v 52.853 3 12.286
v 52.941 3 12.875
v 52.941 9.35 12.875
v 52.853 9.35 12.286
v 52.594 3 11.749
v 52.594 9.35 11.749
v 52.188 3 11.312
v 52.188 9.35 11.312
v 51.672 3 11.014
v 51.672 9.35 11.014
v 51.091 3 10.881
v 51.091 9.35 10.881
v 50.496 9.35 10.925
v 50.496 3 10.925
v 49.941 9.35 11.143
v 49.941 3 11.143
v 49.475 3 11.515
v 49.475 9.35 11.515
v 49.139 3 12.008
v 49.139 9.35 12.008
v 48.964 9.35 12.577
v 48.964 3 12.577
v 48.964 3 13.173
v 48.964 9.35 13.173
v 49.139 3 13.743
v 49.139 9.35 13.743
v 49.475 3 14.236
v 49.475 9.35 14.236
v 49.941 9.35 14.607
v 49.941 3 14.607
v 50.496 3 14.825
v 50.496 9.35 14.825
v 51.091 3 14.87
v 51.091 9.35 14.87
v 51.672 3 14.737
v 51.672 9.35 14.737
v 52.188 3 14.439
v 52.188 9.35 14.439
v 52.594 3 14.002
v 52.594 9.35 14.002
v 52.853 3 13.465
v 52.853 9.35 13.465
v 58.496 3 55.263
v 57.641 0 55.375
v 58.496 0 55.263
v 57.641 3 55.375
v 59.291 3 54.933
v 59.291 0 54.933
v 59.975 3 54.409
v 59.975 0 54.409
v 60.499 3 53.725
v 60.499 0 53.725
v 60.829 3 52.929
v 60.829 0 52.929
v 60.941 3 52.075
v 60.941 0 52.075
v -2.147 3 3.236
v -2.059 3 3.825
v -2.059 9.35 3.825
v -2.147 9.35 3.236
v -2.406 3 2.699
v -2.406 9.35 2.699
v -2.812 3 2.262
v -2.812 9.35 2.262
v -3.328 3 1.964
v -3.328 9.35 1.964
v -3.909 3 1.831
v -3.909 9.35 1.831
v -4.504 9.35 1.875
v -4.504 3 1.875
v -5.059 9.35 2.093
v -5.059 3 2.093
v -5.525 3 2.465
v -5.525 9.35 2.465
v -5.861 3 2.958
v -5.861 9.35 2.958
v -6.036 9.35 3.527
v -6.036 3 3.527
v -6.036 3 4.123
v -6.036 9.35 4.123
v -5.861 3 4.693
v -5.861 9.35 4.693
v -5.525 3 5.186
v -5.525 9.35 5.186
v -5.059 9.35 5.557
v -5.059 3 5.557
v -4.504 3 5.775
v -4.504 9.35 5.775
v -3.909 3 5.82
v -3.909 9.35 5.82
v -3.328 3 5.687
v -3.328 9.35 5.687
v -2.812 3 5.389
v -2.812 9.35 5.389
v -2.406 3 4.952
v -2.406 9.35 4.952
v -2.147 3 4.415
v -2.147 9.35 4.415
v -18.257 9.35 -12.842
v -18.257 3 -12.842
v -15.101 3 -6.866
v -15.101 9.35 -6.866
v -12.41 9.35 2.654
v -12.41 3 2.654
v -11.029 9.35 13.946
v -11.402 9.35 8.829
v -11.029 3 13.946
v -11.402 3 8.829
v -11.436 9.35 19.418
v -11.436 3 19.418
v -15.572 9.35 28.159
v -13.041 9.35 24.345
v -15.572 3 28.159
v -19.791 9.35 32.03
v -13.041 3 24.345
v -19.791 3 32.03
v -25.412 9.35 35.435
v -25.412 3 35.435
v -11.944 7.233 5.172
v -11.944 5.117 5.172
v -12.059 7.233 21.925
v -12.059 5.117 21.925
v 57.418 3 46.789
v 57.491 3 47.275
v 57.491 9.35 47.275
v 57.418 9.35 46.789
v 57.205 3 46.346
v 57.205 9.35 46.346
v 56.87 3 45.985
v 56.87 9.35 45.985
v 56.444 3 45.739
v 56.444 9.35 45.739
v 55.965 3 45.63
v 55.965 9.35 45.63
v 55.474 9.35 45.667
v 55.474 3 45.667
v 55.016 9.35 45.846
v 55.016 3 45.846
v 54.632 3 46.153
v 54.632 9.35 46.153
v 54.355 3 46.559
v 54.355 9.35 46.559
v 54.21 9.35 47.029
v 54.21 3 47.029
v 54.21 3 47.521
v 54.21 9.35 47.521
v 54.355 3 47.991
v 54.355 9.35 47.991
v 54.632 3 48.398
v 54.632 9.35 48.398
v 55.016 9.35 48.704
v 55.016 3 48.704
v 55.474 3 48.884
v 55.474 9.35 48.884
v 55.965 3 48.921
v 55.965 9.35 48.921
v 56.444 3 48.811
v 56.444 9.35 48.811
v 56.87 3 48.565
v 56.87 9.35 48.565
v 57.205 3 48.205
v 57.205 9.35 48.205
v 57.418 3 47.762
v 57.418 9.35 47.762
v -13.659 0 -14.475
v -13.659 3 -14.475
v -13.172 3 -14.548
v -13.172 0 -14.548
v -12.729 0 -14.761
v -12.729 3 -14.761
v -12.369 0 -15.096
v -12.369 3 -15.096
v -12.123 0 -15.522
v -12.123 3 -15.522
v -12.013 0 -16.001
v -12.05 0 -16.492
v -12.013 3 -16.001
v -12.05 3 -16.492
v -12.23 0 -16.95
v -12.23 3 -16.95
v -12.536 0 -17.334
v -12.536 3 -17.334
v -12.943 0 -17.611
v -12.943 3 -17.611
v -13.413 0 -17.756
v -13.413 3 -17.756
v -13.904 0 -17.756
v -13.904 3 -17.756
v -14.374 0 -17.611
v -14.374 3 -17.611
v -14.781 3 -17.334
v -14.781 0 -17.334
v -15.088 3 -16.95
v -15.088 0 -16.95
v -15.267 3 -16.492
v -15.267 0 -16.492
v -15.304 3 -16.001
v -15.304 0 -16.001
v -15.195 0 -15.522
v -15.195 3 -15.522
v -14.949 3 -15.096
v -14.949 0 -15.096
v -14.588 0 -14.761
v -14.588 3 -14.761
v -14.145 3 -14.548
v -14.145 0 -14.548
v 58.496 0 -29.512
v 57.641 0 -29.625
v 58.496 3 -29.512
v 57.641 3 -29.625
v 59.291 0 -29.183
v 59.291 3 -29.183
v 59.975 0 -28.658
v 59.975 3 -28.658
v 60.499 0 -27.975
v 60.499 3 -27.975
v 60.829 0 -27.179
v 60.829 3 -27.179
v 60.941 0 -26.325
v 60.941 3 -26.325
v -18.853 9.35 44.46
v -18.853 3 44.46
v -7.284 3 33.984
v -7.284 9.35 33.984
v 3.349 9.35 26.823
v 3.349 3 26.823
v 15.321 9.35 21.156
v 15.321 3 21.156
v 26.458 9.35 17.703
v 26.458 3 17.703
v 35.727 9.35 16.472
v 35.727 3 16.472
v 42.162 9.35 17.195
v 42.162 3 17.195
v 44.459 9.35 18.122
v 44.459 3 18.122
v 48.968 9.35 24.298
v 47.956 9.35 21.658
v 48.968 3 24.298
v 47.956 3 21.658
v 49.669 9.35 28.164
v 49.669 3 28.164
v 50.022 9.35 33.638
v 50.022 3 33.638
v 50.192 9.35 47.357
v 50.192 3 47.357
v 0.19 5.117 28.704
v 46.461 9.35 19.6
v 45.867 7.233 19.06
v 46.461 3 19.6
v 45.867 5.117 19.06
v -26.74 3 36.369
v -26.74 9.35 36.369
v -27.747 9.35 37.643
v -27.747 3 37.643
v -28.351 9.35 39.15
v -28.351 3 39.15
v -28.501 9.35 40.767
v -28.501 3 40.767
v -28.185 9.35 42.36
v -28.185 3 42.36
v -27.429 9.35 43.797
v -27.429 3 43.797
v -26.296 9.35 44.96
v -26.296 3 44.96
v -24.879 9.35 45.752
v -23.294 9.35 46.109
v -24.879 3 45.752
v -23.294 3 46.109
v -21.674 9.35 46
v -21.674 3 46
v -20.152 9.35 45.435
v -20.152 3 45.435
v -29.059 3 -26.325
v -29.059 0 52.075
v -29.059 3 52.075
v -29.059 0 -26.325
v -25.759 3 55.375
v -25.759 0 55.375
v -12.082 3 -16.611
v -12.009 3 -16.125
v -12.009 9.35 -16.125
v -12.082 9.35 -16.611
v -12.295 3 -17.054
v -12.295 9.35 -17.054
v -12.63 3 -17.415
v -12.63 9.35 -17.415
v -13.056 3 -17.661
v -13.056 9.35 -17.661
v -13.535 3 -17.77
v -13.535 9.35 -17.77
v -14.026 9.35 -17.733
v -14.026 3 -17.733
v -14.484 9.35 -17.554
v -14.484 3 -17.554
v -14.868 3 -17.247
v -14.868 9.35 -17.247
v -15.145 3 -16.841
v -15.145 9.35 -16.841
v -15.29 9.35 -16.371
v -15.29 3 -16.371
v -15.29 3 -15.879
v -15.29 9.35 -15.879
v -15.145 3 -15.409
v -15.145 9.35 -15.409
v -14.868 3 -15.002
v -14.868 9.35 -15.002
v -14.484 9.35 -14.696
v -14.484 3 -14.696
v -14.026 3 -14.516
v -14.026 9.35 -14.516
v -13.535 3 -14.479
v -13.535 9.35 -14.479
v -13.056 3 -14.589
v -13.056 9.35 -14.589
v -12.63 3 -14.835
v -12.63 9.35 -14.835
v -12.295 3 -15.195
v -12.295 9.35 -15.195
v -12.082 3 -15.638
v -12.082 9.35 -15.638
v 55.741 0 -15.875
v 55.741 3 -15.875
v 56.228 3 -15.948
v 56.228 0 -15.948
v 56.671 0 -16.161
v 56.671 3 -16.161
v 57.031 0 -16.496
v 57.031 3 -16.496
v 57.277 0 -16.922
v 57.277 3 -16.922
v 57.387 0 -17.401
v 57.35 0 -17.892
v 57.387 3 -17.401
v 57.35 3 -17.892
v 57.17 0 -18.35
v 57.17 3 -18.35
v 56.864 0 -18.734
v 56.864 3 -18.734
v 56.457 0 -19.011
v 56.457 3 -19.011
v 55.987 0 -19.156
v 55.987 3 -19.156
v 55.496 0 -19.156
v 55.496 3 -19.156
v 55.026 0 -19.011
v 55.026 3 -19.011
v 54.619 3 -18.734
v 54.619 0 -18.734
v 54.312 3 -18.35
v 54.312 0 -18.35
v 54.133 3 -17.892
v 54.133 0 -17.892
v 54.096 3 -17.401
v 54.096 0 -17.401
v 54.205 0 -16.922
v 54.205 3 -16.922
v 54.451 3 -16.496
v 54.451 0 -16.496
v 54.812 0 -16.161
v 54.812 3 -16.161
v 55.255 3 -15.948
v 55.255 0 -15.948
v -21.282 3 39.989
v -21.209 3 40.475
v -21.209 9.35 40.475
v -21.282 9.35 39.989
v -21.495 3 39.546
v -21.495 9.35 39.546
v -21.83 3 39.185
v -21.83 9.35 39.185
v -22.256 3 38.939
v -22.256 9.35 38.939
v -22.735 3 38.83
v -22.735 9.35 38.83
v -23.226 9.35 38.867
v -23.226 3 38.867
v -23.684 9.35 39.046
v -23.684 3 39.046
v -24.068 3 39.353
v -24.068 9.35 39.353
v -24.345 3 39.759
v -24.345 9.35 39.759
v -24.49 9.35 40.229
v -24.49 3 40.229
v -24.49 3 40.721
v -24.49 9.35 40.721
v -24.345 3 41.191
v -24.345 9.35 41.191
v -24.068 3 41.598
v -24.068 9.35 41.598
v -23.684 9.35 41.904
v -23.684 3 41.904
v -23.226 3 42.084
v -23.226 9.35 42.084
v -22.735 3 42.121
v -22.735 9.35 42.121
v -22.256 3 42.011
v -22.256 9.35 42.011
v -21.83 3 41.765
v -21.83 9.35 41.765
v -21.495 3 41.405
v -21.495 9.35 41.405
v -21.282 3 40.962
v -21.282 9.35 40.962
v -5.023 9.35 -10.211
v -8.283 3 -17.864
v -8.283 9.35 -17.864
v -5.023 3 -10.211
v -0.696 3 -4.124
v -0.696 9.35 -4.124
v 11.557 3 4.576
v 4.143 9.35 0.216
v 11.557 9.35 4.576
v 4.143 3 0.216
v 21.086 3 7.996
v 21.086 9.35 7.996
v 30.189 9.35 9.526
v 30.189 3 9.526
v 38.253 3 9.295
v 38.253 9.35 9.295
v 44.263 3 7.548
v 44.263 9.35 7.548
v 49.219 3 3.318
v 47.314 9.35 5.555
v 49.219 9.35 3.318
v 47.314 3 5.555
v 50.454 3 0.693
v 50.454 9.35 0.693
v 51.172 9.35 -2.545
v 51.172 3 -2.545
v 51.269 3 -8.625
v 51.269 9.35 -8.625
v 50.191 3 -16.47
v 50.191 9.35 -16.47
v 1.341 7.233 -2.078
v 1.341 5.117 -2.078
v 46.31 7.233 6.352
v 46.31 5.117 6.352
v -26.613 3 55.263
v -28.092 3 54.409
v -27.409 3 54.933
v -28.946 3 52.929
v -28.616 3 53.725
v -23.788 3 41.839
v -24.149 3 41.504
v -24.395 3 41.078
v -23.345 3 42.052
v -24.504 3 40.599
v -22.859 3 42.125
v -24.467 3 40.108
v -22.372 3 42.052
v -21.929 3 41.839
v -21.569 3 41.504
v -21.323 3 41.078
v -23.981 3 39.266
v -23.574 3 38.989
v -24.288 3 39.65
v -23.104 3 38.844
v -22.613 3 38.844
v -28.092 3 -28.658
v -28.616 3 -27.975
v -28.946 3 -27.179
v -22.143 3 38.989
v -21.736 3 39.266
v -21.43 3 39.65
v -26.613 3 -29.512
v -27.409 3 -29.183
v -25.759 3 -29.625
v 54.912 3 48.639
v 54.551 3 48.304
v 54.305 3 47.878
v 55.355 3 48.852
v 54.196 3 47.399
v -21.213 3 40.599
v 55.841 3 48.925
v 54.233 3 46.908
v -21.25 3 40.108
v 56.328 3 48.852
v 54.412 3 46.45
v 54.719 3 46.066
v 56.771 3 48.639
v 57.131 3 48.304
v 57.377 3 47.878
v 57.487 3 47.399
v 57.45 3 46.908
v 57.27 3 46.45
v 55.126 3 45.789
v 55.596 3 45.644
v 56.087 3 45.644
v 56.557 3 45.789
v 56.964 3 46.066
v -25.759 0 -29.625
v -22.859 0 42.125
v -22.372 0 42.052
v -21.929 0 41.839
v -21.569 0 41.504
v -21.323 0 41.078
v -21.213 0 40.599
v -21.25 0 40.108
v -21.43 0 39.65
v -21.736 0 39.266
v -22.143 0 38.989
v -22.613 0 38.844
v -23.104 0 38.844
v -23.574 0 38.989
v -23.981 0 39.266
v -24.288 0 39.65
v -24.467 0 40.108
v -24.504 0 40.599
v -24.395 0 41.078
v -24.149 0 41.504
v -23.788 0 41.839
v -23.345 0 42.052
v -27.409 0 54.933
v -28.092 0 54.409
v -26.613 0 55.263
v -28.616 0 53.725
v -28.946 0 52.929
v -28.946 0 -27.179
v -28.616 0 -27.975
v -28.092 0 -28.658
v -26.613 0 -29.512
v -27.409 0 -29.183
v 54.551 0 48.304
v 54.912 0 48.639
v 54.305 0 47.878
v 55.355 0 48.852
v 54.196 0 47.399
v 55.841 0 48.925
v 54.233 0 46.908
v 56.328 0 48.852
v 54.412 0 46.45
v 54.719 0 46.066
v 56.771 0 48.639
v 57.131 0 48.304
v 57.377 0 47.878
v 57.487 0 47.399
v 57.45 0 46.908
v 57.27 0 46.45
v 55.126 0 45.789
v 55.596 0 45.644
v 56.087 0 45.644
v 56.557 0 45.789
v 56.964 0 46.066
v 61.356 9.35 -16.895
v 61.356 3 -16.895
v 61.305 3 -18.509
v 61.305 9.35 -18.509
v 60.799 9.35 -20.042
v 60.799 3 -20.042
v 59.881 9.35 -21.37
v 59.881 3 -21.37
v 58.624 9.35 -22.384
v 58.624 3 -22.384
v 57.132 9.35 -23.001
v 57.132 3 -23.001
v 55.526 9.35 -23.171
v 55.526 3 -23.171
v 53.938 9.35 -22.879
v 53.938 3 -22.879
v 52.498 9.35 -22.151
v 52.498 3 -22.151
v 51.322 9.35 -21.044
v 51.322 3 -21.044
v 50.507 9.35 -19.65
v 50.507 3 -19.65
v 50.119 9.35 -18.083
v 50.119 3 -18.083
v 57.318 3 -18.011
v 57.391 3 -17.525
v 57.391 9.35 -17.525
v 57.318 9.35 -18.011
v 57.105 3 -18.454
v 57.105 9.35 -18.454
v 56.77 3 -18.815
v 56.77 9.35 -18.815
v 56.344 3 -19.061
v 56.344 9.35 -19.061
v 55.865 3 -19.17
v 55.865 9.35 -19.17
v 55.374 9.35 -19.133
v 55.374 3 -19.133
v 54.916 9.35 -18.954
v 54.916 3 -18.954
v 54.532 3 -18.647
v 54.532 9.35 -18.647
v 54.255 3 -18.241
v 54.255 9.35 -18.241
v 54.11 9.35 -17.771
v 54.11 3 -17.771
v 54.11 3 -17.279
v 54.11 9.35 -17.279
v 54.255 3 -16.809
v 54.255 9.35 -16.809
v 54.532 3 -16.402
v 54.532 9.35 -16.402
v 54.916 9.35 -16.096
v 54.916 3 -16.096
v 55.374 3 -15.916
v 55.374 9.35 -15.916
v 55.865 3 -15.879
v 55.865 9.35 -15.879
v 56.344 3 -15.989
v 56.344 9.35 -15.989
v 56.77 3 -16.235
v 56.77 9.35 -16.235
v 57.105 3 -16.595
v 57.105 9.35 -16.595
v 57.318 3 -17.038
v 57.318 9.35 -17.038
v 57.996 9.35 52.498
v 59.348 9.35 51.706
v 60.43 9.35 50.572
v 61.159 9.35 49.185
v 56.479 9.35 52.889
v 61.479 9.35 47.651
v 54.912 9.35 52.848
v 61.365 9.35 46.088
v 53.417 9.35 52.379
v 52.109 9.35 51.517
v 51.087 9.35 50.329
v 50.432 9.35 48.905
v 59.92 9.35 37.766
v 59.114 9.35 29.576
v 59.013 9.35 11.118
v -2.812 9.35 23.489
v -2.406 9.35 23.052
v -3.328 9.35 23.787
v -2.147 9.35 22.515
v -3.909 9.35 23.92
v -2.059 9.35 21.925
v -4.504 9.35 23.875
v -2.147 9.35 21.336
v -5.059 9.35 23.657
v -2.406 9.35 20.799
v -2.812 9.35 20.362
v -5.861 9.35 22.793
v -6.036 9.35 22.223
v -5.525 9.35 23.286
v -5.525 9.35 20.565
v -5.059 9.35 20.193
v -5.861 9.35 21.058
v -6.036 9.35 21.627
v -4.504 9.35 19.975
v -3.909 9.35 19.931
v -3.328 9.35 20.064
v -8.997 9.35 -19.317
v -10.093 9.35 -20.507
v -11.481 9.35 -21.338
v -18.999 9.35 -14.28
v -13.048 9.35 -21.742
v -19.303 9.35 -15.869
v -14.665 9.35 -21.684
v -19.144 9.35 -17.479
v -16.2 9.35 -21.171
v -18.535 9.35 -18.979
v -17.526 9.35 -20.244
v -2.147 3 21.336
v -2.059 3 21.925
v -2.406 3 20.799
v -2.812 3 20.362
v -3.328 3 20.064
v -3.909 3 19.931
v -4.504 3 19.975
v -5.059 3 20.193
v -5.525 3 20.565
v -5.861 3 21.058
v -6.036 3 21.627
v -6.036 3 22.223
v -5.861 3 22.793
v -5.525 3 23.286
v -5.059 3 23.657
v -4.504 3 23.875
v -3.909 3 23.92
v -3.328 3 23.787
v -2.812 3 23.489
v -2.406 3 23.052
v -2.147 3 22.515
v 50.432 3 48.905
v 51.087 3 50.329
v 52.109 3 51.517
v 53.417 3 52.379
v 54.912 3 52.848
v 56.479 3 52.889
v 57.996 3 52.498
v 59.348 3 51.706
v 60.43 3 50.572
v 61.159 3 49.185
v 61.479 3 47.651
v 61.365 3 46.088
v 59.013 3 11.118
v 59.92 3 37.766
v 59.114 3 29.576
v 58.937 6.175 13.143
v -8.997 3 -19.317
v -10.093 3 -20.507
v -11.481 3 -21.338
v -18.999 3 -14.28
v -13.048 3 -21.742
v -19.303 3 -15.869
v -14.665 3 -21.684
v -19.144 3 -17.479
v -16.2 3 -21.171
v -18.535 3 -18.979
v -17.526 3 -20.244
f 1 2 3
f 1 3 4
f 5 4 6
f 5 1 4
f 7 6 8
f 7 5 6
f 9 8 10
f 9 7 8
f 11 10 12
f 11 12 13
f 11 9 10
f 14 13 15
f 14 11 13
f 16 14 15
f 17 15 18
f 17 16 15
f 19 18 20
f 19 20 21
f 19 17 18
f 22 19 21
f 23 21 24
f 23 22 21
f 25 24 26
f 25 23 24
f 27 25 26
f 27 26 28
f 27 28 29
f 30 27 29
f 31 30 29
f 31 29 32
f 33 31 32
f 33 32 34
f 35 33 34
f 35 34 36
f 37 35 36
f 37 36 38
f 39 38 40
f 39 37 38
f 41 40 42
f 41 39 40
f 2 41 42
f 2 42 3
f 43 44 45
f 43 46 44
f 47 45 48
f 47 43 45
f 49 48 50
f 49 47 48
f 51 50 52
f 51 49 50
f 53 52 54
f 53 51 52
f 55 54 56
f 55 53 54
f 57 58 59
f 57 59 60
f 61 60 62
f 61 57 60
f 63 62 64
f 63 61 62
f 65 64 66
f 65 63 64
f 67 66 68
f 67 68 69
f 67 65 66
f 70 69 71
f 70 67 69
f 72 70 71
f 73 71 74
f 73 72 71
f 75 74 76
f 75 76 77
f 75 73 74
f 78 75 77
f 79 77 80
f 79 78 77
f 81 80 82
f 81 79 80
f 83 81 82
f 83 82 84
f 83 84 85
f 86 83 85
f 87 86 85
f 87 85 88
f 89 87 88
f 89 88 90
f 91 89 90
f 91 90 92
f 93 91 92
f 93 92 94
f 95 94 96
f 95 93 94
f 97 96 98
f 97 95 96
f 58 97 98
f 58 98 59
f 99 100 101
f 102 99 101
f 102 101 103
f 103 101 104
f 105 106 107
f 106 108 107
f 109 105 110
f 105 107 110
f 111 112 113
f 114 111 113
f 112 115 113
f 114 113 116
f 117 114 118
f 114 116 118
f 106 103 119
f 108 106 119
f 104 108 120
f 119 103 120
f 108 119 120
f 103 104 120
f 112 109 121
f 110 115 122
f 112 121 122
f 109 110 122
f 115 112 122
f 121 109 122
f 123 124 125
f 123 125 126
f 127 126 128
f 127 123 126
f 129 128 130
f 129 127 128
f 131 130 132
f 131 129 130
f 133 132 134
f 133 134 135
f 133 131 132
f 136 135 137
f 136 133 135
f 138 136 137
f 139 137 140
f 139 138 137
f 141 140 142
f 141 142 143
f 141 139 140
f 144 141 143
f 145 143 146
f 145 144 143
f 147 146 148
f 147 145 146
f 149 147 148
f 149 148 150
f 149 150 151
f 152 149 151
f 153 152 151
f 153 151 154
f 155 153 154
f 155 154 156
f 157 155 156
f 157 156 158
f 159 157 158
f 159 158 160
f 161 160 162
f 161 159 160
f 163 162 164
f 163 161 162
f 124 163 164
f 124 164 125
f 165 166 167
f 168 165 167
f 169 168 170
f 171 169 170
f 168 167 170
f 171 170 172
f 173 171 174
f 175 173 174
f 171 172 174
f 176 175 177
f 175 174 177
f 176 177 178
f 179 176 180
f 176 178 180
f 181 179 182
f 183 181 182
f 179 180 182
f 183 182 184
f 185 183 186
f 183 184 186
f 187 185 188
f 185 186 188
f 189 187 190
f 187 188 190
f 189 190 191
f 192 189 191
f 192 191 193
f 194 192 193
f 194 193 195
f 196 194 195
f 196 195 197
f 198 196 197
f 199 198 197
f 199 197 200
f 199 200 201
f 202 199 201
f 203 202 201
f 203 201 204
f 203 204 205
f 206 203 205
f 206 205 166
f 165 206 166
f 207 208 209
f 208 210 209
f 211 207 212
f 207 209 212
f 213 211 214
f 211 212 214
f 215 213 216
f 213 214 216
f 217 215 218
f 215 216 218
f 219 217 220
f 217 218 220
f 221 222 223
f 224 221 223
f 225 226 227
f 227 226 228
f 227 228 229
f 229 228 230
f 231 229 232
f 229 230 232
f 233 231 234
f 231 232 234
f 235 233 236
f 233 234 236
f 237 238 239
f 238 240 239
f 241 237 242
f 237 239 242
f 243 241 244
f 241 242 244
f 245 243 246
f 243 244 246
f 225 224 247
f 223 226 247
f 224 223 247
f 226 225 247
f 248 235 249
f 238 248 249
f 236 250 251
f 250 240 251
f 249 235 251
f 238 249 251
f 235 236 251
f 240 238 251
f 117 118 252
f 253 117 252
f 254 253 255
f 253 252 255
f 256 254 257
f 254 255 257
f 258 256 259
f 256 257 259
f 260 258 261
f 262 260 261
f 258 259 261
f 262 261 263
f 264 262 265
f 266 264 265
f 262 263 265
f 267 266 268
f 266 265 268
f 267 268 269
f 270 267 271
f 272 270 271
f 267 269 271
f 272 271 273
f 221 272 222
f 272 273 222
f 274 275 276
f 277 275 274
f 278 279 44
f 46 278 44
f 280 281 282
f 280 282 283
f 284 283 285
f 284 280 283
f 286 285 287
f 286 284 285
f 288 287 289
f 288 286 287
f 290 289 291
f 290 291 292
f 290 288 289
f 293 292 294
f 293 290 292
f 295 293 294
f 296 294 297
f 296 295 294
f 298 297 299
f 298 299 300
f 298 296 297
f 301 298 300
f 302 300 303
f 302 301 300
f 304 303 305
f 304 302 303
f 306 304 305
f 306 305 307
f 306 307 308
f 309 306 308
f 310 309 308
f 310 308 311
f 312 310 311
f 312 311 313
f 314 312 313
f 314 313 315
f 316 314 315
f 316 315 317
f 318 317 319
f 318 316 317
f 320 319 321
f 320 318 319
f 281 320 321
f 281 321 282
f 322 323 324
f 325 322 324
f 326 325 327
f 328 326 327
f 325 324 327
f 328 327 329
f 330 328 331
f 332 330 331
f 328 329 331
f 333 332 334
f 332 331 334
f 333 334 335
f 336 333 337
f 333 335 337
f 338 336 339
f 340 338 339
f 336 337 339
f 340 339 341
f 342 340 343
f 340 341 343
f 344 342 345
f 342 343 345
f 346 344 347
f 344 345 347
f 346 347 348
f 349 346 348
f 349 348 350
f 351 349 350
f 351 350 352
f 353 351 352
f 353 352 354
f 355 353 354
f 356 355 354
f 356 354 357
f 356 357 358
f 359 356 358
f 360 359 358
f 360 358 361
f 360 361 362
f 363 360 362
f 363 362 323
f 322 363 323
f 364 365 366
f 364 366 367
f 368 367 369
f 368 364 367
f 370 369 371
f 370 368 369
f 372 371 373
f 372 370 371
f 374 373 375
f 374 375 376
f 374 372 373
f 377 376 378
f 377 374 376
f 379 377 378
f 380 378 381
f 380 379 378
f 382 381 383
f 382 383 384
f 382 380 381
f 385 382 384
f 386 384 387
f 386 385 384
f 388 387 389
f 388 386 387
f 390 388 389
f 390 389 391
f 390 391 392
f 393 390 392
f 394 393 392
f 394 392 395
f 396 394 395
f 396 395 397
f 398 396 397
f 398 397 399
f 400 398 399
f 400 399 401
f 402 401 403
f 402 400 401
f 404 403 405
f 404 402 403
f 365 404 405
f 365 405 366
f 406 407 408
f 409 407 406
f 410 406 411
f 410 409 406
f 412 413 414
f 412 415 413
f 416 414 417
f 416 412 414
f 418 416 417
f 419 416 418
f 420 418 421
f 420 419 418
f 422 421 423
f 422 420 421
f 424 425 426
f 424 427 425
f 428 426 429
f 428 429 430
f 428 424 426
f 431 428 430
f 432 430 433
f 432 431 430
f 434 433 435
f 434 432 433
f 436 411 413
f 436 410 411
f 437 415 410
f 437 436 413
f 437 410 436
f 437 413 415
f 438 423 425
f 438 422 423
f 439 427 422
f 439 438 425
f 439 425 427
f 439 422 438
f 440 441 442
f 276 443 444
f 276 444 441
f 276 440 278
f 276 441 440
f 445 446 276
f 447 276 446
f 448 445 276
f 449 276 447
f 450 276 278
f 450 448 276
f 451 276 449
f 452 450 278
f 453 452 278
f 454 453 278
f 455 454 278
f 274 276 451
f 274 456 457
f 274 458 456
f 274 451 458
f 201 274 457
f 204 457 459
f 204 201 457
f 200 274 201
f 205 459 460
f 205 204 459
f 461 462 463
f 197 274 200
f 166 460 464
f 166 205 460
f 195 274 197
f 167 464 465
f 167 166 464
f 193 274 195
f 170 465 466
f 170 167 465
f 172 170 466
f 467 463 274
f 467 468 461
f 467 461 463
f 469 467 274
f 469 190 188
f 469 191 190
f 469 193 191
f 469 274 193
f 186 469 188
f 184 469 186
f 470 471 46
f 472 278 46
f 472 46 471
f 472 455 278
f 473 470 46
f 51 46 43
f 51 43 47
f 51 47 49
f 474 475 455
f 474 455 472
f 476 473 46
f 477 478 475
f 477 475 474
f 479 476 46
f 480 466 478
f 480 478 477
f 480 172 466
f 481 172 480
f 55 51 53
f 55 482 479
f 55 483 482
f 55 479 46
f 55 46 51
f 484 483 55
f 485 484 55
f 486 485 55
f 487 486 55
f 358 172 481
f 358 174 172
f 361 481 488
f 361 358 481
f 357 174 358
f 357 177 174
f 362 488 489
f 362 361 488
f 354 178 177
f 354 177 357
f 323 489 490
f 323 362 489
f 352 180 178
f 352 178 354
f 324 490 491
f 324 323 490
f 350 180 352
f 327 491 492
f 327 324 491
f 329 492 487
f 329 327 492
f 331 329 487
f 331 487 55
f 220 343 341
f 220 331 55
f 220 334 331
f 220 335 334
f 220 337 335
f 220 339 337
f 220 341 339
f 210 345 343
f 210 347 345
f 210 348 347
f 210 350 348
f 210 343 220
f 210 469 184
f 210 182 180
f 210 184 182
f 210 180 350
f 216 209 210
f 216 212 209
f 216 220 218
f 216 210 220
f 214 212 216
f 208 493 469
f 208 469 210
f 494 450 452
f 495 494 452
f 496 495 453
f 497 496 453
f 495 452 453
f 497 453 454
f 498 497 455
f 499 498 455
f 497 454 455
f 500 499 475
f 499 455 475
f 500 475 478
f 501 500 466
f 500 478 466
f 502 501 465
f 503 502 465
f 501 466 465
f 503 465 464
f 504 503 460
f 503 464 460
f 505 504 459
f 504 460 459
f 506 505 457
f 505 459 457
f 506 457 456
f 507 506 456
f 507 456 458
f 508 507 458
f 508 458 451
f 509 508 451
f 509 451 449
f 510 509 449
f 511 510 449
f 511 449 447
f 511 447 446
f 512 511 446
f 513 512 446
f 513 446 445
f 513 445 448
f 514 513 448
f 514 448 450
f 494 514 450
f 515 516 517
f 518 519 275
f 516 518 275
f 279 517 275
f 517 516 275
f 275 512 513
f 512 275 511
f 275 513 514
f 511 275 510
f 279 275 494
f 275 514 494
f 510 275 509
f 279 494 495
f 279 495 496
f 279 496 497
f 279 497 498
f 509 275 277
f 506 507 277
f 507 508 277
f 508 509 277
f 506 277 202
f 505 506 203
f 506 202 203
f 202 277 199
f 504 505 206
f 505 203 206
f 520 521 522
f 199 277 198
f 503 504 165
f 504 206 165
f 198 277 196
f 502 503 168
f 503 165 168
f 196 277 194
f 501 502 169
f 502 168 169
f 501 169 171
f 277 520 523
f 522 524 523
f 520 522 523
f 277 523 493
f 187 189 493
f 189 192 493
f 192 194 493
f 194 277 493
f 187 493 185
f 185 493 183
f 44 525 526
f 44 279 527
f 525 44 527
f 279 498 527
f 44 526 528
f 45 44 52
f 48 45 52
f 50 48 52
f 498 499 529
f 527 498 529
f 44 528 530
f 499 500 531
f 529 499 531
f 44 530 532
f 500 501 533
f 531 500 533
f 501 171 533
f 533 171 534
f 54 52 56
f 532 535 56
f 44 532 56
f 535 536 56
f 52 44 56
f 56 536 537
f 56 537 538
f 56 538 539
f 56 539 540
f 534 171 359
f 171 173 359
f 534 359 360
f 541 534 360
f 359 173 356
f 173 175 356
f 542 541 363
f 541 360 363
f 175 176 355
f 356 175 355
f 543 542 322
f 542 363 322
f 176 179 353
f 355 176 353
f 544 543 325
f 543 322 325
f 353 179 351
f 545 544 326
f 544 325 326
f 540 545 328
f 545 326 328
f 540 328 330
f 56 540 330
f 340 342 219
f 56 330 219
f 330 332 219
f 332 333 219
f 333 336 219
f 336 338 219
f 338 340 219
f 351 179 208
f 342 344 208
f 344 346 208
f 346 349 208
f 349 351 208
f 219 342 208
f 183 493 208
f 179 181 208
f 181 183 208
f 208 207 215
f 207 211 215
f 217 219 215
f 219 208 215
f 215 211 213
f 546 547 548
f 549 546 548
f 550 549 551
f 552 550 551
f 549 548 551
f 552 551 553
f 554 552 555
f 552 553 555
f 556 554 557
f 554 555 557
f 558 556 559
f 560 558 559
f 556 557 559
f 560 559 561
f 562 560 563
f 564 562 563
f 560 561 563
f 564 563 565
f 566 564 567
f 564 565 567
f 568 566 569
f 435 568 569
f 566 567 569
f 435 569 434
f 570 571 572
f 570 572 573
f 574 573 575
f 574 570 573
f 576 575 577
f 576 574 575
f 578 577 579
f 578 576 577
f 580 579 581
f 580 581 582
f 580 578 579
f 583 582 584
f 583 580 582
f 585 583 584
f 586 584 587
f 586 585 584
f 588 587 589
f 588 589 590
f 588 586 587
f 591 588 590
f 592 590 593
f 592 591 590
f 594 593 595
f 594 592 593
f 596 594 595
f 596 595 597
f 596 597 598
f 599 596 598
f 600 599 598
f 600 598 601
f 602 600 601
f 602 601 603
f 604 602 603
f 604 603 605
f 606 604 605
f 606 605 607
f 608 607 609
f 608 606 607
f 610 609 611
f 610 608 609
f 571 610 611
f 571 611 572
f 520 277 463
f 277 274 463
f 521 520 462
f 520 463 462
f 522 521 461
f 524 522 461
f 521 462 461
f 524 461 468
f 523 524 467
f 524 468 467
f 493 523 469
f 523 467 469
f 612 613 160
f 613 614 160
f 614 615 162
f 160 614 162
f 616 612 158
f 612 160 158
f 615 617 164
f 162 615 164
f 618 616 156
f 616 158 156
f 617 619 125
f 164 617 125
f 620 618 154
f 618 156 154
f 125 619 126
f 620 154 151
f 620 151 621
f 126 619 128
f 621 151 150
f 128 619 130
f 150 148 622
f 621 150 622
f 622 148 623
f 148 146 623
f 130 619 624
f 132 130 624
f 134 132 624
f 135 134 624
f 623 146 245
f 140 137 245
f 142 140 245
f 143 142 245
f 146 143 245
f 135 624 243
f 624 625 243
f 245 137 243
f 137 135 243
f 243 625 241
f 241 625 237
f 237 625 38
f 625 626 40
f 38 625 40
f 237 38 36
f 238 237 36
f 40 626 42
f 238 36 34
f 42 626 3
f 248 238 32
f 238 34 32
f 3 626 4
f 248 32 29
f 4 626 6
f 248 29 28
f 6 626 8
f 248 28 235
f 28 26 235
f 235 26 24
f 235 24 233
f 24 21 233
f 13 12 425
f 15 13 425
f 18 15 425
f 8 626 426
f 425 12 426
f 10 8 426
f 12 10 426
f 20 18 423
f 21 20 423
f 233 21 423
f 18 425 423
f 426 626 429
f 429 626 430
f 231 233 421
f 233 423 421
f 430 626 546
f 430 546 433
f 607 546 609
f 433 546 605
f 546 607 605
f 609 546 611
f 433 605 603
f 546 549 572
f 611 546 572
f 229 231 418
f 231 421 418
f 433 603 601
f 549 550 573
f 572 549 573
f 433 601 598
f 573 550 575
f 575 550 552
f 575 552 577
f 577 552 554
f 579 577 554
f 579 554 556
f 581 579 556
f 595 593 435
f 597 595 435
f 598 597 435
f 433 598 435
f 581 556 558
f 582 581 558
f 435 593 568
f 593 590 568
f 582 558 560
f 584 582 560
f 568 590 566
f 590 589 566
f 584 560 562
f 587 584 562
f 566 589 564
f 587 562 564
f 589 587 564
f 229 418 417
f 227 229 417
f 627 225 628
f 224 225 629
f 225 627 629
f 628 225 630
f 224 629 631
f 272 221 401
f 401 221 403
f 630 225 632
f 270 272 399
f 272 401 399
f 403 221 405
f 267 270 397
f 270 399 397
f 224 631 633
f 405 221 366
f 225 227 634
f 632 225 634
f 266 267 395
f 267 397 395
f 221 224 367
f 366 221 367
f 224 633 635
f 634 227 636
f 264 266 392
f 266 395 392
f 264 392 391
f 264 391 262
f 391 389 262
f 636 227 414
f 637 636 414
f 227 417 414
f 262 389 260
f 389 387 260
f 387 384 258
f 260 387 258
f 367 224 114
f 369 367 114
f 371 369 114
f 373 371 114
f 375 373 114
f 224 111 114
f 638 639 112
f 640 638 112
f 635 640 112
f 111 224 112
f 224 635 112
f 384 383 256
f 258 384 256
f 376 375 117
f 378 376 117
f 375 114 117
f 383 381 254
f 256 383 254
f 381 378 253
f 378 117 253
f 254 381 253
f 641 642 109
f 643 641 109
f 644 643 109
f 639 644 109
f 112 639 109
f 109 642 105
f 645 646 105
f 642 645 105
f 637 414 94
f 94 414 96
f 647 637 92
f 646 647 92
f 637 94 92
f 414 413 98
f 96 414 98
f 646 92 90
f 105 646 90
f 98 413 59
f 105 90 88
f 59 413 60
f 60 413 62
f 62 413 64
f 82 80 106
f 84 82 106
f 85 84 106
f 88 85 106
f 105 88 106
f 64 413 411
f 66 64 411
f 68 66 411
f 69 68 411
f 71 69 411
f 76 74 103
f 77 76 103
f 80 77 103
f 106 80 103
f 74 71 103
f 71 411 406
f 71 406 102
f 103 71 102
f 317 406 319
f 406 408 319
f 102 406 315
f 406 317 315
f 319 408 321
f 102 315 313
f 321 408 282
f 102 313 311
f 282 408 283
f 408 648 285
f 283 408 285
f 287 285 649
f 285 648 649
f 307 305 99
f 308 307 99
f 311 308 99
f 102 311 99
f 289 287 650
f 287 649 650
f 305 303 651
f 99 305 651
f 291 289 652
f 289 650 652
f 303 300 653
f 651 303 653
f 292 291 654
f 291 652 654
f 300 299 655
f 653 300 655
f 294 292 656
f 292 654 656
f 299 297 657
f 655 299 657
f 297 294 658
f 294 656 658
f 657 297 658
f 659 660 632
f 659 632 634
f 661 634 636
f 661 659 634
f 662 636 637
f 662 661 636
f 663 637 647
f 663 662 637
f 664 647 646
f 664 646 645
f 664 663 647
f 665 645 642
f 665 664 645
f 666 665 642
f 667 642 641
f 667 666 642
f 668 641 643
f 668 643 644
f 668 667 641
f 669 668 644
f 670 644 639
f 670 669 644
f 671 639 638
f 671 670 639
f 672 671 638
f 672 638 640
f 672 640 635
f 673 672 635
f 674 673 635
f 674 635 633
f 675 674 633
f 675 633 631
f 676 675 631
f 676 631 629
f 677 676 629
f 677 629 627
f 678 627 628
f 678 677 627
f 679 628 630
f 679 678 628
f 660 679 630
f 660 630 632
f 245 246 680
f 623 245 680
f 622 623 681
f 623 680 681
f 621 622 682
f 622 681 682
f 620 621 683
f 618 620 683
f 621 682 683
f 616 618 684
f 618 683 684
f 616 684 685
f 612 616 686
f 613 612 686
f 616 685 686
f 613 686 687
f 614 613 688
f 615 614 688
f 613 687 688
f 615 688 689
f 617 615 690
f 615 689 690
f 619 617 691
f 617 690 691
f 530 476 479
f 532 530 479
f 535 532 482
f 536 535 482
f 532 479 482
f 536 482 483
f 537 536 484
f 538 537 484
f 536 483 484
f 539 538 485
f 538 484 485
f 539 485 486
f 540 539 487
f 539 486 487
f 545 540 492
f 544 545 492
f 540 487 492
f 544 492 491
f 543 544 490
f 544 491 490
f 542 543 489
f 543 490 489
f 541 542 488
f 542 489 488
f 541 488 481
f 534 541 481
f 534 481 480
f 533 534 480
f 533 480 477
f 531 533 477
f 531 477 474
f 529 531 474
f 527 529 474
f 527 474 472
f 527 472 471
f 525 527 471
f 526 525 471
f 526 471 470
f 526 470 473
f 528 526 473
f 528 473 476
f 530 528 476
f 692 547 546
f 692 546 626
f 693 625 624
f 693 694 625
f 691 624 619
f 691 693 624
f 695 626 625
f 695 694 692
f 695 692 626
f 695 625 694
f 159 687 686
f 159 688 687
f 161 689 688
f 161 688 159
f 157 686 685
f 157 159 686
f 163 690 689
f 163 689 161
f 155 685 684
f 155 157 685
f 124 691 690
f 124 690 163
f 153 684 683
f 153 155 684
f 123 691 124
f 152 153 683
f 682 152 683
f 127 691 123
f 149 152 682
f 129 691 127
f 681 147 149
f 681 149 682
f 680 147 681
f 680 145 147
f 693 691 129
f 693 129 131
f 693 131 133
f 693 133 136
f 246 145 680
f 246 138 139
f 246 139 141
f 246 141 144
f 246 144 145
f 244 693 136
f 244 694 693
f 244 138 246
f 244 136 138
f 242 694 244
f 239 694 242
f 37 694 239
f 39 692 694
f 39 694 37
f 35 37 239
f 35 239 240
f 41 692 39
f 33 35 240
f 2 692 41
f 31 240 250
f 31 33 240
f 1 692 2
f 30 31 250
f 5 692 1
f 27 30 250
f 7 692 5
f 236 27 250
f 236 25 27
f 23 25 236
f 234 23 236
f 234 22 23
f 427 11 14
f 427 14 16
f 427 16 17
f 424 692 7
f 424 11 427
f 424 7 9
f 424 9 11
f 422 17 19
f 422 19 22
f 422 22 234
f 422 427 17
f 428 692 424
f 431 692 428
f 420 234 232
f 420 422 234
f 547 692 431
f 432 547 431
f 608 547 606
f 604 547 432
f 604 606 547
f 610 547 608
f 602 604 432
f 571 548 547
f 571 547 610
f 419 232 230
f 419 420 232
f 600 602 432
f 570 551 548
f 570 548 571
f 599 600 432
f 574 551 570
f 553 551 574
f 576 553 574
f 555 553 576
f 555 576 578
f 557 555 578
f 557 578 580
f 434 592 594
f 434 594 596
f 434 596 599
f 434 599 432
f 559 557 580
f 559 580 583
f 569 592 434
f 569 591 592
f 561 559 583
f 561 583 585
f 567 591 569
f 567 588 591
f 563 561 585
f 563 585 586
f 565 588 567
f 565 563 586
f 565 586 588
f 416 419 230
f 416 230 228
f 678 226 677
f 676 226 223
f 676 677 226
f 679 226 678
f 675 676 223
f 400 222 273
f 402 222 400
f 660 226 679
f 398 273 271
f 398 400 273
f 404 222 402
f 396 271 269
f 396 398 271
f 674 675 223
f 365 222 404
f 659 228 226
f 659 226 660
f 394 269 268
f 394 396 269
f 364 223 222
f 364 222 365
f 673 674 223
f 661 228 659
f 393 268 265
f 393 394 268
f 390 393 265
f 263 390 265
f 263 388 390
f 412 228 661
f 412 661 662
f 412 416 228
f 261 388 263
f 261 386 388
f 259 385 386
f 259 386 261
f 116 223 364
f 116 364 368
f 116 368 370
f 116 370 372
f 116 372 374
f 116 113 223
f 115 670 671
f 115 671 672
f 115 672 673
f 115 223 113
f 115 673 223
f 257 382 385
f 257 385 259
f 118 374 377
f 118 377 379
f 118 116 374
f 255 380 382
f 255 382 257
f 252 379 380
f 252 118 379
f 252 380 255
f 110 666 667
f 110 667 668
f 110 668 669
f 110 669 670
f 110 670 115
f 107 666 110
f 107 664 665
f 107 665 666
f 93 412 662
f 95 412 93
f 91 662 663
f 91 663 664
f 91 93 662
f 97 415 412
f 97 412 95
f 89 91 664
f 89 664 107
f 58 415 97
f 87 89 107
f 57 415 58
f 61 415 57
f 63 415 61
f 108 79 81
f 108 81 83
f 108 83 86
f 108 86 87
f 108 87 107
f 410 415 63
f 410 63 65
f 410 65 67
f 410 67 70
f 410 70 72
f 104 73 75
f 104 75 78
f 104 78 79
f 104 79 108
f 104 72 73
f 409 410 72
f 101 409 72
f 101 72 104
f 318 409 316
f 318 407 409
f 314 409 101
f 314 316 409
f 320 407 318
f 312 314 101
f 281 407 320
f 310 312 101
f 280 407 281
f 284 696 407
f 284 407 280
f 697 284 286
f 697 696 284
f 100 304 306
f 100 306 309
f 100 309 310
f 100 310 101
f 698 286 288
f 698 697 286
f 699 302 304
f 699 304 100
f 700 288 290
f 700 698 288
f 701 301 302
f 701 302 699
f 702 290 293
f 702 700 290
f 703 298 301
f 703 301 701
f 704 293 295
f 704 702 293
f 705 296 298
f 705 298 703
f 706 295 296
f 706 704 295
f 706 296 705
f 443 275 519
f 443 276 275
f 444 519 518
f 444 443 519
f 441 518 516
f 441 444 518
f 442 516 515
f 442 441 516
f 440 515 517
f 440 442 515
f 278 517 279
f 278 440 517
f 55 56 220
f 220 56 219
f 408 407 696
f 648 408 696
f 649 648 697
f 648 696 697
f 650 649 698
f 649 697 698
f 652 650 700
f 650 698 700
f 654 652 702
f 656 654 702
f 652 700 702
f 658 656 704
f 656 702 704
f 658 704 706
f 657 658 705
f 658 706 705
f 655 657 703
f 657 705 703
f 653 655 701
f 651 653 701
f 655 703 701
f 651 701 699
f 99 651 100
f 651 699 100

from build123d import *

# Parameters (mm, degrees)
SKETCH1_W           = 90
SKETCH1_H           = 85
BOSS_EXTRUDE1_DEPTH = 3
SKETCH4_R           = 1.65
SKETCH4_R_2         = 2
BOSS_EXTRUDE2_DEPTH = 6.35
SKETCH4_3_R         = 1.65
CUT_EXTRUDE1_DEPTH  = 83.993665433
FILLET1_R           = 3.3


with BuildPart() as part:
    # Sketch1 → Boss-Extrude1 (new body)
    with BuildSketch(Plane(origin=(0, 0, 0), x_dir=(1, 0, 0), z_dir=(0, 1, 0))):
        with Locations((15.941430843, -12.87535482)):
            Rectangle(SKETCH1_W, SKETCH1_H)
    extrude(amount=BOSS_EXTRUDE1_DEPTH)

    # Sketch4<3> → Cut-Extrude1 (cut, through all)
    with BuildSketch(Plane(origin=(0, 3, 0), x_dir=(1, 0, 0), z_dir=(0, 1, 0))):
        with Locations((-13.658569157, 16.12464518)):
            Circle(SKETCH4_3_R)
        with Locations((55.741430843, 17.52464518)):
            Circle(SKETCH4_3_R)
        with Locations((-22.858569157, -40.47535482)):
            Circle(SKETCH4_3_R)
        with Locations((55.841430843, -47.27535482)):
            Circle(SKETCH4_3_R)
    extrude(amount=-CUT_EXTRUDE1_DEPTH, mode=Mode.SUBTRACT)

    # Fillet1
    fillet1_edges = [part.edges().sort_by_distance(p)[0] for p in [
        (-29.058569157, 1.5, 55.37535482),
        (60.941430843, 1.5, 55.37535482),
        (60.941430843, 1.5, -29.62464518),
        (-29.058569157, 1.5, -29.62464518),
    ]]
    fillet(fillet1_edges, radius=FILLET1_R)


with BuildPart() as body_2:
    # Sketch4 → Boss-Extrude2 (new body)
    with BuildSketch(Plane(origin=(0, 3, 0), x_dir=(1, 0, 0), z_dir=(0, 1, 0))):
        with BuildLine():
            ThreePointArc((-8.283067345, 17.864323387), (-16.199767479, 21.170912225), (-18.256911207, 12.84169675))
            add(Edge.make_bspline(
                [(-18.256911207, 12.84169675), (-14.92913649, 8.180567665), (-11.474229497, -4.299496978), (-9.93847644, -23.715578027), (-18.304090766, -31.835085279), (-25.411515924, -35.435021219)],
                knots=[0, 0, 0, 0, 0.348075626, 0.653605665, 1, 1, 1, 1], degree=3))
            ThreePointArc((-25.411515924, -35.435021219), (-27.429243311, -43.796715653), (-18.853178535, -44.460244525))
            add(Edge.make_bspline(
                [(-18.853178535, -44.460244525), (-14.475177411, -40.059720058), (4.008938201, -22.223634722), (51.742301245, -8.842814223), (49.964952893, -31.64353292), (50.19202066, -47.356991777)],
                knots=[0, 0, 0, 0, 0.247102159, 0.71381752, 1.000000001, 1.000000001, 1.000000001, 1.000000001], degree=3))
            ThreePointArc((50.19202066, -47.356991777), (56.478789612, -52.889290498), (61.365360002, -46.088465341))
            add(Edge.make_bspline(
                [(61.365360002, -46.088465341), (58.937486206, -34.788843016), (58.574256962, -23.966071998), (58.936942589, -13.143294965), (59.267804417, -3.270160996), (60.202779447, 6.602977947), (61.356278652, 16.895372523)],
                knots=[0.967910845, 0.967910845, 0.967910845, 0.967910845, 1.490853614, 1.490853616, 1.490853616, 1.967910881, 1.967910881, 1.967910881, 1.967910881], degree=3))
            ThreePointArc((61.356278652, 16.895372523), (55.526404465, 23.170551986), (50.190710775, 16.470127882))
            add(Edge.make_bspline(
                [(50.190710775, 16.470127882), (52.644819358, 3.552303028), (51.229075419, -2.859768981), (36.588288176, -13.25478094), (3.724548889, -6.934694412), (-6.34166017, 11.865491104), (-8.283067345, 17.864323387)],
                knots=[0.735099529, 0.735099529, 0.735099529, 0.735099529, 0.999999998, 1, 1.523536868, 1.735099533, 1.735099533, 1.735099533, 1.735099533], degree=3))
        make_face()
        with Locations((-13.658569157, 16.12464518)):
            Circle(SKETCH4_R, mode=Mode.SUBTRACT)
        with Locations((-4.058569157, -3.82535482)):
            Circle(SKETCH4_R_2, mode=Mode.SUBTRACT)
        with Locations((50.941430843, -12.87535482)):
            Circle(SKETCH4_R_2, mode=Mode.SUBTRACT)
        with Locations((-4.058569157, -21.92535482)):
            Circle(SKETCH4_R_2, mode=Mode.SUBTRACT)
        with Locations((55.741430843, 17.52464518)):
            Circle(SKETCH4_R, mode=Mode.SUBTRACT)
        with Locations((55.841430843, -47.27535482)):
            Circle(SKETCH4_R, mode=Mode.SUBTRACT)
        with Locations((-22.858569157, -40.47535482)):
            Circle(SKETCH4_R, mode=Mode.SUBTRACT)
    extrude(amount=BOSS_EXTRUDE2_DEPTH)


solid = Compound([part.part, body_2.part])
